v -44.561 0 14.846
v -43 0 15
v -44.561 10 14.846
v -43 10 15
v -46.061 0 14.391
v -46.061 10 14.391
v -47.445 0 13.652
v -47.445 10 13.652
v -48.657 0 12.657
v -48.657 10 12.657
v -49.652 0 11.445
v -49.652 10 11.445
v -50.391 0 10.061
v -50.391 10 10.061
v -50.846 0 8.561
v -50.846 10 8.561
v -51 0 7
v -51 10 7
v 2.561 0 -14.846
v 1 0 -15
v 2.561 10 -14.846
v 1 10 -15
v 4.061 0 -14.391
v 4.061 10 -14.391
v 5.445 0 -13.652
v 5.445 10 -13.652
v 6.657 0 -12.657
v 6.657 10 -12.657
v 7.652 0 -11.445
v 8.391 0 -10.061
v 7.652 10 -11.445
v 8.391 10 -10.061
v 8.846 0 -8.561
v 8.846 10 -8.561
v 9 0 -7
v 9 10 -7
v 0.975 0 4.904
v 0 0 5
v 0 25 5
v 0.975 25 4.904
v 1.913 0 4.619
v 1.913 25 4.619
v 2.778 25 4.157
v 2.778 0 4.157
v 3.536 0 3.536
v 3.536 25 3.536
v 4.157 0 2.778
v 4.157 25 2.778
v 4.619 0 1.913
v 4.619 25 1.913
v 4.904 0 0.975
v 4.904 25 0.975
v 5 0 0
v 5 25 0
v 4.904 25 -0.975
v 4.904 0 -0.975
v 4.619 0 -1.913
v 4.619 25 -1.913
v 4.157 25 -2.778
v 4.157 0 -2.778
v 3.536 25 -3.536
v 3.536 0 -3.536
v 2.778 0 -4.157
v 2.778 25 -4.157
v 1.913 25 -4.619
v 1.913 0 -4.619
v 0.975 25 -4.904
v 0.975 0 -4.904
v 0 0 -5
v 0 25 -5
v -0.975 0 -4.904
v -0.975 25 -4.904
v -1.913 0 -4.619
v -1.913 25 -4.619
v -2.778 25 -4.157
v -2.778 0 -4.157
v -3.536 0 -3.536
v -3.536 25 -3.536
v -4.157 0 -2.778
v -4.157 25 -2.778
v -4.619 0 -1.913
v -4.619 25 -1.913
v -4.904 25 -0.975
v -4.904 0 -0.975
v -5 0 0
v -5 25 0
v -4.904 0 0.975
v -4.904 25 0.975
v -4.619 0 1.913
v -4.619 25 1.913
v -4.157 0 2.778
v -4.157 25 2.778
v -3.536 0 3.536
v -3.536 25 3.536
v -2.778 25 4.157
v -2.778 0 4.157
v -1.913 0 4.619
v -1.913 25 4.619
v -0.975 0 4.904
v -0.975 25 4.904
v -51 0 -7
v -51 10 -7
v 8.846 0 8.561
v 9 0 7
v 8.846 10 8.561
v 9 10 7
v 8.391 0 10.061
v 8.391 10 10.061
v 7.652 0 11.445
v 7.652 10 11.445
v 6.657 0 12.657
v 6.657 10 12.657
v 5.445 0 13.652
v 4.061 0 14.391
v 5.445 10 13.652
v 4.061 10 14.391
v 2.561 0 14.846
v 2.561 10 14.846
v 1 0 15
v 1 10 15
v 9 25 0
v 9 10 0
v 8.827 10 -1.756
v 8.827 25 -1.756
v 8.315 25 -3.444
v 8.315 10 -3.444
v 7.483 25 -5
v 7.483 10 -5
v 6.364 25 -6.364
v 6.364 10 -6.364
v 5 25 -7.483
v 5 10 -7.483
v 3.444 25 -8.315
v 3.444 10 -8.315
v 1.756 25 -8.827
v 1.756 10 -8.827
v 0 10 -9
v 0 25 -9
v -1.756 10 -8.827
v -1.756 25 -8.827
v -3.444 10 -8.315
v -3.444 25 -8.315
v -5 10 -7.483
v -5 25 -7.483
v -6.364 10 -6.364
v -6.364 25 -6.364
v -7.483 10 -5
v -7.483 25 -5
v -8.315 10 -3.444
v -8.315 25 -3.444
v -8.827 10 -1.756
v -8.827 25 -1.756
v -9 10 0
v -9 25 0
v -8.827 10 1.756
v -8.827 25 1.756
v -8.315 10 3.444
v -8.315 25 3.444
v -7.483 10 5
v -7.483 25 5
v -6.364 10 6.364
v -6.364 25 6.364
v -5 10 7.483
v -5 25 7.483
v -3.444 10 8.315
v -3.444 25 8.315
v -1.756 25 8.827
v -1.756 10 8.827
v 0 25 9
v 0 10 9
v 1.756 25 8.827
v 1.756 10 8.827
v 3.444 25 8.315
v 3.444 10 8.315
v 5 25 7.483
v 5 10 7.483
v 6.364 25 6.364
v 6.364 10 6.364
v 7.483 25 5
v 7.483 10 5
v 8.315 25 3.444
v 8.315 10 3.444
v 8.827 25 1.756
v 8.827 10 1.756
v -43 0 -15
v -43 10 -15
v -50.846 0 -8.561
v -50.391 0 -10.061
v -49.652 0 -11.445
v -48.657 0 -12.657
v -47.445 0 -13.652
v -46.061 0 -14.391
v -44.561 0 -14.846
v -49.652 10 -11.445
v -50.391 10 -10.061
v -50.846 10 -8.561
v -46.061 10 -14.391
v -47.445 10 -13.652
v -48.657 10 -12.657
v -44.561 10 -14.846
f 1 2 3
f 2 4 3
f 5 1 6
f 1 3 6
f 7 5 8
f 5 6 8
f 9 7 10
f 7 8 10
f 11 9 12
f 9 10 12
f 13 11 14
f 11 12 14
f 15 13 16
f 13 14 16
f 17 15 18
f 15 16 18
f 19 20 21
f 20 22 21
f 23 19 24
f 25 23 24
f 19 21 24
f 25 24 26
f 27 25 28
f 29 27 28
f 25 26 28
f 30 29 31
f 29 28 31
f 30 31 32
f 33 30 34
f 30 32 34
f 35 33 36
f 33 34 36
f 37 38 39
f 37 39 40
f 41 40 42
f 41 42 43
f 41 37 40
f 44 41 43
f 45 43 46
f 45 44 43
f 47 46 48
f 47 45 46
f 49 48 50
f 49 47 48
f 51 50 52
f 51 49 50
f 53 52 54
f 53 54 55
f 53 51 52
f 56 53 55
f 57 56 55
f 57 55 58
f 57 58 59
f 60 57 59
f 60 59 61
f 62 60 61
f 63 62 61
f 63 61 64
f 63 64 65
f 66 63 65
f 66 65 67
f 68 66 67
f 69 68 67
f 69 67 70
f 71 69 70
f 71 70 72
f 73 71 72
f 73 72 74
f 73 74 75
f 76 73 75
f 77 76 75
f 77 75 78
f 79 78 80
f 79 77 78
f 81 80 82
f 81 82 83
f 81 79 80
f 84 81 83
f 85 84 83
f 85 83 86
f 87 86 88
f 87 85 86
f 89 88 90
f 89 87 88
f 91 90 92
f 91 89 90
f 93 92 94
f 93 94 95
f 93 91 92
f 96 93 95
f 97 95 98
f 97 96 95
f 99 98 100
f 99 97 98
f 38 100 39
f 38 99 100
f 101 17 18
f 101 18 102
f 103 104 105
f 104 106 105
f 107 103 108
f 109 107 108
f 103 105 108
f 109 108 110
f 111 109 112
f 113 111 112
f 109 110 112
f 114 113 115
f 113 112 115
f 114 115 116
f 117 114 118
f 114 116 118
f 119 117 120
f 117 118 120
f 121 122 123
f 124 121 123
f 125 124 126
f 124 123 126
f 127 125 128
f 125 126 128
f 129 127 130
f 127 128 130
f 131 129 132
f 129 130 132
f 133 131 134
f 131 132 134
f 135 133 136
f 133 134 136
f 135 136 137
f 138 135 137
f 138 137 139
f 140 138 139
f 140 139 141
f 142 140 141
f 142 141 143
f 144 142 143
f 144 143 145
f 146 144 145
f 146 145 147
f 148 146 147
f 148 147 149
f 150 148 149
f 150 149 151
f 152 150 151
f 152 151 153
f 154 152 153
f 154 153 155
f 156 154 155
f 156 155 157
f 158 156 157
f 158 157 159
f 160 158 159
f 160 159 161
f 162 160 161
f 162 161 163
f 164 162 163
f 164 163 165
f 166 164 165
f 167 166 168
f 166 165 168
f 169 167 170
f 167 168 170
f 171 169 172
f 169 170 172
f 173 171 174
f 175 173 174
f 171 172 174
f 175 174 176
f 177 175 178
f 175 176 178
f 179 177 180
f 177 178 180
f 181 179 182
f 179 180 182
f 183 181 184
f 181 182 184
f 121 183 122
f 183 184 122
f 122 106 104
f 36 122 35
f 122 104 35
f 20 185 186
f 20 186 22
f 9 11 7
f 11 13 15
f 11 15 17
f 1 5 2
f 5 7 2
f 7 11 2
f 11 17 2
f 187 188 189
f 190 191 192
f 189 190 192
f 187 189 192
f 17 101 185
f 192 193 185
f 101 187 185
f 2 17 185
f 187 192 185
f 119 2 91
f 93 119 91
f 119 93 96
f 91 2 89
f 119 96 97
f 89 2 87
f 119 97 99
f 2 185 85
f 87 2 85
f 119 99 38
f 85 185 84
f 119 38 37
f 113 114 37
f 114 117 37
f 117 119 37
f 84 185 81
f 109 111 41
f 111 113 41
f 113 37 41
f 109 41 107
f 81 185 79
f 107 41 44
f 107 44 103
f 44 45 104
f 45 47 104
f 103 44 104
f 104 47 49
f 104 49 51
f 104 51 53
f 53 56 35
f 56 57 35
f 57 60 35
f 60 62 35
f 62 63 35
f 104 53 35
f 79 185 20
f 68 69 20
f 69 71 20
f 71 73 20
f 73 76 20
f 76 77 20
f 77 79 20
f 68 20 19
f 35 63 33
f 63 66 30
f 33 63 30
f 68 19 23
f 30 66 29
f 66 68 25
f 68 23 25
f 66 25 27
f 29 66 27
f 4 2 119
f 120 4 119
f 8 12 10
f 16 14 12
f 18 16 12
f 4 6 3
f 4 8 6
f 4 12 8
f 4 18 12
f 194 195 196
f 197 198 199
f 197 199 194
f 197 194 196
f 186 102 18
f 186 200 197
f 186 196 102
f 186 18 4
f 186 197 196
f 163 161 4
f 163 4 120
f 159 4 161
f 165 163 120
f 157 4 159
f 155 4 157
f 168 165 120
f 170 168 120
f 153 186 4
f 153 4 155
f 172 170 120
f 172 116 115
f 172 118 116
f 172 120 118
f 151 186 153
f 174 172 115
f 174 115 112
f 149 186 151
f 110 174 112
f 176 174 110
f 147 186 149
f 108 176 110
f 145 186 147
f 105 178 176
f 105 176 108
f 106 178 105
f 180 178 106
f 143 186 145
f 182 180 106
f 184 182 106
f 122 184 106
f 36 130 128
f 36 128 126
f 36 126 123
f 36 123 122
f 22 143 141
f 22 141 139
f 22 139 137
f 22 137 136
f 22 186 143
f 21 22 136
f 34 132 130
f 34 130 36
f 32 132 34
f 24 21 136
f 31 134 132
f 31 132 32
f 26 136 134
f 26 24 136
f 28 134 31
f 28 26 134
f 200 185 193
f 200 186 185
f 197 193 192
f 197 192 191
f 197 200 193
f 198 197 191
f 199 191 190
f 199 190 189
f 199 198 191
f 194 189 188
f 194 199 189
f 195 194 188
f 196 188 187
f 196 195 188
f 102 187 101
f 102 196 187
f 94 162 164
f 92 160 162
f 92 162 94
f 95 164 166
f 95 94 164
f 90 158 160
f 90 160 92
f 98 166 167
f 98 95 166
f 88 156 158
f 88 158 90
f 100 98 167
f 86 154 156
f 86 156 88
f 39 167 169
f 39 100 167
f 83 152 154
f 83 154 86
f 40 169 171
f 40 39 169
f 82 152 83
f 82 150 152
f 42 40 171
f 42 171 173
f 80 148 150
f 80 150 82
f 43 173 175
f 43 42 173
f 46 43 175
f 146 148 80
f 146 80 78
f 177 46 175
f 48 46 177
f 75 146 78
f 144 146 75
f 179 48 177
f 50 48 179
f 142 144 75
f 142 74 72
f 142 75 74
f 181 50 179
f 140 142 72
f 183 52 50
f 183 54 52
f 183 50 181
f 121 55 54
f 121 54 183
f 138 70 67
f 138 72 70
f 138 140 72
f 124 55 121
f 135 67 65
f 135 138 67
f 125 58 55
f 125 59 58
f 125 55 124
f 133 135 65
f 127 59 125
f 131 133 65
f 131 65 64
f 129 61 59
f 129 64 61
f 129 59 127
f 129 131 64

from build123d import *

# Parameters (mm, degrees)
SKETCH1_W           = 60
SKETCH1_H           = 30
SKETCH1_R           = 5
BOSS_EXTRUDE1_DEPTH = 10
FILLET1_R           = 8
SKETCH1_3_R         = 9
SKETCH1_3_R_2       = 5
BOSS_EXTRUDE2_DEPTH = 25


with BuildPart() as part:
    # Sketch1 → Boss-Extrude1 (new body)
    with BuildSketch(Plane(origin=(0, 0, 0), x_dir=(1, 0, 0), z_dir=(0, 1, 0))):
        with Locations((-21, 0)):
            Rectangle(SKETCH1_W, SKETCH1_H)
        Circle(SKETCH1_R, mode=Mode.SUBTRACT)
    extrude(amount=BOSS_EXTRUDE1_DEPTH)

    # Fillet1
    fillet1_edges = [part.edges().sort_by_distance(p)[0] for p in [
        (-51, 5, 15),
        (-51, 5, -15),
        (9, 5, -15),
        (9, 5, 15),
    ]]
    fillet(fillet1_edges, radius=FILLET1_R)

    # Sketch1<3> → Boss-Extrude2 (add)
    with BuildSketch(Plane(origin=(0, 0, 0), x_dir=(1, 0, 0), z_dir=(0, 1, 0))):
        Circle(SKETCH1_3_R)
        Circle(SKETCH1_3_R_2, mode=Mode.SUBTRACT)
    extrude(amount=BOSS_EXTRUDE2_DEPTH)


solid = part.part
